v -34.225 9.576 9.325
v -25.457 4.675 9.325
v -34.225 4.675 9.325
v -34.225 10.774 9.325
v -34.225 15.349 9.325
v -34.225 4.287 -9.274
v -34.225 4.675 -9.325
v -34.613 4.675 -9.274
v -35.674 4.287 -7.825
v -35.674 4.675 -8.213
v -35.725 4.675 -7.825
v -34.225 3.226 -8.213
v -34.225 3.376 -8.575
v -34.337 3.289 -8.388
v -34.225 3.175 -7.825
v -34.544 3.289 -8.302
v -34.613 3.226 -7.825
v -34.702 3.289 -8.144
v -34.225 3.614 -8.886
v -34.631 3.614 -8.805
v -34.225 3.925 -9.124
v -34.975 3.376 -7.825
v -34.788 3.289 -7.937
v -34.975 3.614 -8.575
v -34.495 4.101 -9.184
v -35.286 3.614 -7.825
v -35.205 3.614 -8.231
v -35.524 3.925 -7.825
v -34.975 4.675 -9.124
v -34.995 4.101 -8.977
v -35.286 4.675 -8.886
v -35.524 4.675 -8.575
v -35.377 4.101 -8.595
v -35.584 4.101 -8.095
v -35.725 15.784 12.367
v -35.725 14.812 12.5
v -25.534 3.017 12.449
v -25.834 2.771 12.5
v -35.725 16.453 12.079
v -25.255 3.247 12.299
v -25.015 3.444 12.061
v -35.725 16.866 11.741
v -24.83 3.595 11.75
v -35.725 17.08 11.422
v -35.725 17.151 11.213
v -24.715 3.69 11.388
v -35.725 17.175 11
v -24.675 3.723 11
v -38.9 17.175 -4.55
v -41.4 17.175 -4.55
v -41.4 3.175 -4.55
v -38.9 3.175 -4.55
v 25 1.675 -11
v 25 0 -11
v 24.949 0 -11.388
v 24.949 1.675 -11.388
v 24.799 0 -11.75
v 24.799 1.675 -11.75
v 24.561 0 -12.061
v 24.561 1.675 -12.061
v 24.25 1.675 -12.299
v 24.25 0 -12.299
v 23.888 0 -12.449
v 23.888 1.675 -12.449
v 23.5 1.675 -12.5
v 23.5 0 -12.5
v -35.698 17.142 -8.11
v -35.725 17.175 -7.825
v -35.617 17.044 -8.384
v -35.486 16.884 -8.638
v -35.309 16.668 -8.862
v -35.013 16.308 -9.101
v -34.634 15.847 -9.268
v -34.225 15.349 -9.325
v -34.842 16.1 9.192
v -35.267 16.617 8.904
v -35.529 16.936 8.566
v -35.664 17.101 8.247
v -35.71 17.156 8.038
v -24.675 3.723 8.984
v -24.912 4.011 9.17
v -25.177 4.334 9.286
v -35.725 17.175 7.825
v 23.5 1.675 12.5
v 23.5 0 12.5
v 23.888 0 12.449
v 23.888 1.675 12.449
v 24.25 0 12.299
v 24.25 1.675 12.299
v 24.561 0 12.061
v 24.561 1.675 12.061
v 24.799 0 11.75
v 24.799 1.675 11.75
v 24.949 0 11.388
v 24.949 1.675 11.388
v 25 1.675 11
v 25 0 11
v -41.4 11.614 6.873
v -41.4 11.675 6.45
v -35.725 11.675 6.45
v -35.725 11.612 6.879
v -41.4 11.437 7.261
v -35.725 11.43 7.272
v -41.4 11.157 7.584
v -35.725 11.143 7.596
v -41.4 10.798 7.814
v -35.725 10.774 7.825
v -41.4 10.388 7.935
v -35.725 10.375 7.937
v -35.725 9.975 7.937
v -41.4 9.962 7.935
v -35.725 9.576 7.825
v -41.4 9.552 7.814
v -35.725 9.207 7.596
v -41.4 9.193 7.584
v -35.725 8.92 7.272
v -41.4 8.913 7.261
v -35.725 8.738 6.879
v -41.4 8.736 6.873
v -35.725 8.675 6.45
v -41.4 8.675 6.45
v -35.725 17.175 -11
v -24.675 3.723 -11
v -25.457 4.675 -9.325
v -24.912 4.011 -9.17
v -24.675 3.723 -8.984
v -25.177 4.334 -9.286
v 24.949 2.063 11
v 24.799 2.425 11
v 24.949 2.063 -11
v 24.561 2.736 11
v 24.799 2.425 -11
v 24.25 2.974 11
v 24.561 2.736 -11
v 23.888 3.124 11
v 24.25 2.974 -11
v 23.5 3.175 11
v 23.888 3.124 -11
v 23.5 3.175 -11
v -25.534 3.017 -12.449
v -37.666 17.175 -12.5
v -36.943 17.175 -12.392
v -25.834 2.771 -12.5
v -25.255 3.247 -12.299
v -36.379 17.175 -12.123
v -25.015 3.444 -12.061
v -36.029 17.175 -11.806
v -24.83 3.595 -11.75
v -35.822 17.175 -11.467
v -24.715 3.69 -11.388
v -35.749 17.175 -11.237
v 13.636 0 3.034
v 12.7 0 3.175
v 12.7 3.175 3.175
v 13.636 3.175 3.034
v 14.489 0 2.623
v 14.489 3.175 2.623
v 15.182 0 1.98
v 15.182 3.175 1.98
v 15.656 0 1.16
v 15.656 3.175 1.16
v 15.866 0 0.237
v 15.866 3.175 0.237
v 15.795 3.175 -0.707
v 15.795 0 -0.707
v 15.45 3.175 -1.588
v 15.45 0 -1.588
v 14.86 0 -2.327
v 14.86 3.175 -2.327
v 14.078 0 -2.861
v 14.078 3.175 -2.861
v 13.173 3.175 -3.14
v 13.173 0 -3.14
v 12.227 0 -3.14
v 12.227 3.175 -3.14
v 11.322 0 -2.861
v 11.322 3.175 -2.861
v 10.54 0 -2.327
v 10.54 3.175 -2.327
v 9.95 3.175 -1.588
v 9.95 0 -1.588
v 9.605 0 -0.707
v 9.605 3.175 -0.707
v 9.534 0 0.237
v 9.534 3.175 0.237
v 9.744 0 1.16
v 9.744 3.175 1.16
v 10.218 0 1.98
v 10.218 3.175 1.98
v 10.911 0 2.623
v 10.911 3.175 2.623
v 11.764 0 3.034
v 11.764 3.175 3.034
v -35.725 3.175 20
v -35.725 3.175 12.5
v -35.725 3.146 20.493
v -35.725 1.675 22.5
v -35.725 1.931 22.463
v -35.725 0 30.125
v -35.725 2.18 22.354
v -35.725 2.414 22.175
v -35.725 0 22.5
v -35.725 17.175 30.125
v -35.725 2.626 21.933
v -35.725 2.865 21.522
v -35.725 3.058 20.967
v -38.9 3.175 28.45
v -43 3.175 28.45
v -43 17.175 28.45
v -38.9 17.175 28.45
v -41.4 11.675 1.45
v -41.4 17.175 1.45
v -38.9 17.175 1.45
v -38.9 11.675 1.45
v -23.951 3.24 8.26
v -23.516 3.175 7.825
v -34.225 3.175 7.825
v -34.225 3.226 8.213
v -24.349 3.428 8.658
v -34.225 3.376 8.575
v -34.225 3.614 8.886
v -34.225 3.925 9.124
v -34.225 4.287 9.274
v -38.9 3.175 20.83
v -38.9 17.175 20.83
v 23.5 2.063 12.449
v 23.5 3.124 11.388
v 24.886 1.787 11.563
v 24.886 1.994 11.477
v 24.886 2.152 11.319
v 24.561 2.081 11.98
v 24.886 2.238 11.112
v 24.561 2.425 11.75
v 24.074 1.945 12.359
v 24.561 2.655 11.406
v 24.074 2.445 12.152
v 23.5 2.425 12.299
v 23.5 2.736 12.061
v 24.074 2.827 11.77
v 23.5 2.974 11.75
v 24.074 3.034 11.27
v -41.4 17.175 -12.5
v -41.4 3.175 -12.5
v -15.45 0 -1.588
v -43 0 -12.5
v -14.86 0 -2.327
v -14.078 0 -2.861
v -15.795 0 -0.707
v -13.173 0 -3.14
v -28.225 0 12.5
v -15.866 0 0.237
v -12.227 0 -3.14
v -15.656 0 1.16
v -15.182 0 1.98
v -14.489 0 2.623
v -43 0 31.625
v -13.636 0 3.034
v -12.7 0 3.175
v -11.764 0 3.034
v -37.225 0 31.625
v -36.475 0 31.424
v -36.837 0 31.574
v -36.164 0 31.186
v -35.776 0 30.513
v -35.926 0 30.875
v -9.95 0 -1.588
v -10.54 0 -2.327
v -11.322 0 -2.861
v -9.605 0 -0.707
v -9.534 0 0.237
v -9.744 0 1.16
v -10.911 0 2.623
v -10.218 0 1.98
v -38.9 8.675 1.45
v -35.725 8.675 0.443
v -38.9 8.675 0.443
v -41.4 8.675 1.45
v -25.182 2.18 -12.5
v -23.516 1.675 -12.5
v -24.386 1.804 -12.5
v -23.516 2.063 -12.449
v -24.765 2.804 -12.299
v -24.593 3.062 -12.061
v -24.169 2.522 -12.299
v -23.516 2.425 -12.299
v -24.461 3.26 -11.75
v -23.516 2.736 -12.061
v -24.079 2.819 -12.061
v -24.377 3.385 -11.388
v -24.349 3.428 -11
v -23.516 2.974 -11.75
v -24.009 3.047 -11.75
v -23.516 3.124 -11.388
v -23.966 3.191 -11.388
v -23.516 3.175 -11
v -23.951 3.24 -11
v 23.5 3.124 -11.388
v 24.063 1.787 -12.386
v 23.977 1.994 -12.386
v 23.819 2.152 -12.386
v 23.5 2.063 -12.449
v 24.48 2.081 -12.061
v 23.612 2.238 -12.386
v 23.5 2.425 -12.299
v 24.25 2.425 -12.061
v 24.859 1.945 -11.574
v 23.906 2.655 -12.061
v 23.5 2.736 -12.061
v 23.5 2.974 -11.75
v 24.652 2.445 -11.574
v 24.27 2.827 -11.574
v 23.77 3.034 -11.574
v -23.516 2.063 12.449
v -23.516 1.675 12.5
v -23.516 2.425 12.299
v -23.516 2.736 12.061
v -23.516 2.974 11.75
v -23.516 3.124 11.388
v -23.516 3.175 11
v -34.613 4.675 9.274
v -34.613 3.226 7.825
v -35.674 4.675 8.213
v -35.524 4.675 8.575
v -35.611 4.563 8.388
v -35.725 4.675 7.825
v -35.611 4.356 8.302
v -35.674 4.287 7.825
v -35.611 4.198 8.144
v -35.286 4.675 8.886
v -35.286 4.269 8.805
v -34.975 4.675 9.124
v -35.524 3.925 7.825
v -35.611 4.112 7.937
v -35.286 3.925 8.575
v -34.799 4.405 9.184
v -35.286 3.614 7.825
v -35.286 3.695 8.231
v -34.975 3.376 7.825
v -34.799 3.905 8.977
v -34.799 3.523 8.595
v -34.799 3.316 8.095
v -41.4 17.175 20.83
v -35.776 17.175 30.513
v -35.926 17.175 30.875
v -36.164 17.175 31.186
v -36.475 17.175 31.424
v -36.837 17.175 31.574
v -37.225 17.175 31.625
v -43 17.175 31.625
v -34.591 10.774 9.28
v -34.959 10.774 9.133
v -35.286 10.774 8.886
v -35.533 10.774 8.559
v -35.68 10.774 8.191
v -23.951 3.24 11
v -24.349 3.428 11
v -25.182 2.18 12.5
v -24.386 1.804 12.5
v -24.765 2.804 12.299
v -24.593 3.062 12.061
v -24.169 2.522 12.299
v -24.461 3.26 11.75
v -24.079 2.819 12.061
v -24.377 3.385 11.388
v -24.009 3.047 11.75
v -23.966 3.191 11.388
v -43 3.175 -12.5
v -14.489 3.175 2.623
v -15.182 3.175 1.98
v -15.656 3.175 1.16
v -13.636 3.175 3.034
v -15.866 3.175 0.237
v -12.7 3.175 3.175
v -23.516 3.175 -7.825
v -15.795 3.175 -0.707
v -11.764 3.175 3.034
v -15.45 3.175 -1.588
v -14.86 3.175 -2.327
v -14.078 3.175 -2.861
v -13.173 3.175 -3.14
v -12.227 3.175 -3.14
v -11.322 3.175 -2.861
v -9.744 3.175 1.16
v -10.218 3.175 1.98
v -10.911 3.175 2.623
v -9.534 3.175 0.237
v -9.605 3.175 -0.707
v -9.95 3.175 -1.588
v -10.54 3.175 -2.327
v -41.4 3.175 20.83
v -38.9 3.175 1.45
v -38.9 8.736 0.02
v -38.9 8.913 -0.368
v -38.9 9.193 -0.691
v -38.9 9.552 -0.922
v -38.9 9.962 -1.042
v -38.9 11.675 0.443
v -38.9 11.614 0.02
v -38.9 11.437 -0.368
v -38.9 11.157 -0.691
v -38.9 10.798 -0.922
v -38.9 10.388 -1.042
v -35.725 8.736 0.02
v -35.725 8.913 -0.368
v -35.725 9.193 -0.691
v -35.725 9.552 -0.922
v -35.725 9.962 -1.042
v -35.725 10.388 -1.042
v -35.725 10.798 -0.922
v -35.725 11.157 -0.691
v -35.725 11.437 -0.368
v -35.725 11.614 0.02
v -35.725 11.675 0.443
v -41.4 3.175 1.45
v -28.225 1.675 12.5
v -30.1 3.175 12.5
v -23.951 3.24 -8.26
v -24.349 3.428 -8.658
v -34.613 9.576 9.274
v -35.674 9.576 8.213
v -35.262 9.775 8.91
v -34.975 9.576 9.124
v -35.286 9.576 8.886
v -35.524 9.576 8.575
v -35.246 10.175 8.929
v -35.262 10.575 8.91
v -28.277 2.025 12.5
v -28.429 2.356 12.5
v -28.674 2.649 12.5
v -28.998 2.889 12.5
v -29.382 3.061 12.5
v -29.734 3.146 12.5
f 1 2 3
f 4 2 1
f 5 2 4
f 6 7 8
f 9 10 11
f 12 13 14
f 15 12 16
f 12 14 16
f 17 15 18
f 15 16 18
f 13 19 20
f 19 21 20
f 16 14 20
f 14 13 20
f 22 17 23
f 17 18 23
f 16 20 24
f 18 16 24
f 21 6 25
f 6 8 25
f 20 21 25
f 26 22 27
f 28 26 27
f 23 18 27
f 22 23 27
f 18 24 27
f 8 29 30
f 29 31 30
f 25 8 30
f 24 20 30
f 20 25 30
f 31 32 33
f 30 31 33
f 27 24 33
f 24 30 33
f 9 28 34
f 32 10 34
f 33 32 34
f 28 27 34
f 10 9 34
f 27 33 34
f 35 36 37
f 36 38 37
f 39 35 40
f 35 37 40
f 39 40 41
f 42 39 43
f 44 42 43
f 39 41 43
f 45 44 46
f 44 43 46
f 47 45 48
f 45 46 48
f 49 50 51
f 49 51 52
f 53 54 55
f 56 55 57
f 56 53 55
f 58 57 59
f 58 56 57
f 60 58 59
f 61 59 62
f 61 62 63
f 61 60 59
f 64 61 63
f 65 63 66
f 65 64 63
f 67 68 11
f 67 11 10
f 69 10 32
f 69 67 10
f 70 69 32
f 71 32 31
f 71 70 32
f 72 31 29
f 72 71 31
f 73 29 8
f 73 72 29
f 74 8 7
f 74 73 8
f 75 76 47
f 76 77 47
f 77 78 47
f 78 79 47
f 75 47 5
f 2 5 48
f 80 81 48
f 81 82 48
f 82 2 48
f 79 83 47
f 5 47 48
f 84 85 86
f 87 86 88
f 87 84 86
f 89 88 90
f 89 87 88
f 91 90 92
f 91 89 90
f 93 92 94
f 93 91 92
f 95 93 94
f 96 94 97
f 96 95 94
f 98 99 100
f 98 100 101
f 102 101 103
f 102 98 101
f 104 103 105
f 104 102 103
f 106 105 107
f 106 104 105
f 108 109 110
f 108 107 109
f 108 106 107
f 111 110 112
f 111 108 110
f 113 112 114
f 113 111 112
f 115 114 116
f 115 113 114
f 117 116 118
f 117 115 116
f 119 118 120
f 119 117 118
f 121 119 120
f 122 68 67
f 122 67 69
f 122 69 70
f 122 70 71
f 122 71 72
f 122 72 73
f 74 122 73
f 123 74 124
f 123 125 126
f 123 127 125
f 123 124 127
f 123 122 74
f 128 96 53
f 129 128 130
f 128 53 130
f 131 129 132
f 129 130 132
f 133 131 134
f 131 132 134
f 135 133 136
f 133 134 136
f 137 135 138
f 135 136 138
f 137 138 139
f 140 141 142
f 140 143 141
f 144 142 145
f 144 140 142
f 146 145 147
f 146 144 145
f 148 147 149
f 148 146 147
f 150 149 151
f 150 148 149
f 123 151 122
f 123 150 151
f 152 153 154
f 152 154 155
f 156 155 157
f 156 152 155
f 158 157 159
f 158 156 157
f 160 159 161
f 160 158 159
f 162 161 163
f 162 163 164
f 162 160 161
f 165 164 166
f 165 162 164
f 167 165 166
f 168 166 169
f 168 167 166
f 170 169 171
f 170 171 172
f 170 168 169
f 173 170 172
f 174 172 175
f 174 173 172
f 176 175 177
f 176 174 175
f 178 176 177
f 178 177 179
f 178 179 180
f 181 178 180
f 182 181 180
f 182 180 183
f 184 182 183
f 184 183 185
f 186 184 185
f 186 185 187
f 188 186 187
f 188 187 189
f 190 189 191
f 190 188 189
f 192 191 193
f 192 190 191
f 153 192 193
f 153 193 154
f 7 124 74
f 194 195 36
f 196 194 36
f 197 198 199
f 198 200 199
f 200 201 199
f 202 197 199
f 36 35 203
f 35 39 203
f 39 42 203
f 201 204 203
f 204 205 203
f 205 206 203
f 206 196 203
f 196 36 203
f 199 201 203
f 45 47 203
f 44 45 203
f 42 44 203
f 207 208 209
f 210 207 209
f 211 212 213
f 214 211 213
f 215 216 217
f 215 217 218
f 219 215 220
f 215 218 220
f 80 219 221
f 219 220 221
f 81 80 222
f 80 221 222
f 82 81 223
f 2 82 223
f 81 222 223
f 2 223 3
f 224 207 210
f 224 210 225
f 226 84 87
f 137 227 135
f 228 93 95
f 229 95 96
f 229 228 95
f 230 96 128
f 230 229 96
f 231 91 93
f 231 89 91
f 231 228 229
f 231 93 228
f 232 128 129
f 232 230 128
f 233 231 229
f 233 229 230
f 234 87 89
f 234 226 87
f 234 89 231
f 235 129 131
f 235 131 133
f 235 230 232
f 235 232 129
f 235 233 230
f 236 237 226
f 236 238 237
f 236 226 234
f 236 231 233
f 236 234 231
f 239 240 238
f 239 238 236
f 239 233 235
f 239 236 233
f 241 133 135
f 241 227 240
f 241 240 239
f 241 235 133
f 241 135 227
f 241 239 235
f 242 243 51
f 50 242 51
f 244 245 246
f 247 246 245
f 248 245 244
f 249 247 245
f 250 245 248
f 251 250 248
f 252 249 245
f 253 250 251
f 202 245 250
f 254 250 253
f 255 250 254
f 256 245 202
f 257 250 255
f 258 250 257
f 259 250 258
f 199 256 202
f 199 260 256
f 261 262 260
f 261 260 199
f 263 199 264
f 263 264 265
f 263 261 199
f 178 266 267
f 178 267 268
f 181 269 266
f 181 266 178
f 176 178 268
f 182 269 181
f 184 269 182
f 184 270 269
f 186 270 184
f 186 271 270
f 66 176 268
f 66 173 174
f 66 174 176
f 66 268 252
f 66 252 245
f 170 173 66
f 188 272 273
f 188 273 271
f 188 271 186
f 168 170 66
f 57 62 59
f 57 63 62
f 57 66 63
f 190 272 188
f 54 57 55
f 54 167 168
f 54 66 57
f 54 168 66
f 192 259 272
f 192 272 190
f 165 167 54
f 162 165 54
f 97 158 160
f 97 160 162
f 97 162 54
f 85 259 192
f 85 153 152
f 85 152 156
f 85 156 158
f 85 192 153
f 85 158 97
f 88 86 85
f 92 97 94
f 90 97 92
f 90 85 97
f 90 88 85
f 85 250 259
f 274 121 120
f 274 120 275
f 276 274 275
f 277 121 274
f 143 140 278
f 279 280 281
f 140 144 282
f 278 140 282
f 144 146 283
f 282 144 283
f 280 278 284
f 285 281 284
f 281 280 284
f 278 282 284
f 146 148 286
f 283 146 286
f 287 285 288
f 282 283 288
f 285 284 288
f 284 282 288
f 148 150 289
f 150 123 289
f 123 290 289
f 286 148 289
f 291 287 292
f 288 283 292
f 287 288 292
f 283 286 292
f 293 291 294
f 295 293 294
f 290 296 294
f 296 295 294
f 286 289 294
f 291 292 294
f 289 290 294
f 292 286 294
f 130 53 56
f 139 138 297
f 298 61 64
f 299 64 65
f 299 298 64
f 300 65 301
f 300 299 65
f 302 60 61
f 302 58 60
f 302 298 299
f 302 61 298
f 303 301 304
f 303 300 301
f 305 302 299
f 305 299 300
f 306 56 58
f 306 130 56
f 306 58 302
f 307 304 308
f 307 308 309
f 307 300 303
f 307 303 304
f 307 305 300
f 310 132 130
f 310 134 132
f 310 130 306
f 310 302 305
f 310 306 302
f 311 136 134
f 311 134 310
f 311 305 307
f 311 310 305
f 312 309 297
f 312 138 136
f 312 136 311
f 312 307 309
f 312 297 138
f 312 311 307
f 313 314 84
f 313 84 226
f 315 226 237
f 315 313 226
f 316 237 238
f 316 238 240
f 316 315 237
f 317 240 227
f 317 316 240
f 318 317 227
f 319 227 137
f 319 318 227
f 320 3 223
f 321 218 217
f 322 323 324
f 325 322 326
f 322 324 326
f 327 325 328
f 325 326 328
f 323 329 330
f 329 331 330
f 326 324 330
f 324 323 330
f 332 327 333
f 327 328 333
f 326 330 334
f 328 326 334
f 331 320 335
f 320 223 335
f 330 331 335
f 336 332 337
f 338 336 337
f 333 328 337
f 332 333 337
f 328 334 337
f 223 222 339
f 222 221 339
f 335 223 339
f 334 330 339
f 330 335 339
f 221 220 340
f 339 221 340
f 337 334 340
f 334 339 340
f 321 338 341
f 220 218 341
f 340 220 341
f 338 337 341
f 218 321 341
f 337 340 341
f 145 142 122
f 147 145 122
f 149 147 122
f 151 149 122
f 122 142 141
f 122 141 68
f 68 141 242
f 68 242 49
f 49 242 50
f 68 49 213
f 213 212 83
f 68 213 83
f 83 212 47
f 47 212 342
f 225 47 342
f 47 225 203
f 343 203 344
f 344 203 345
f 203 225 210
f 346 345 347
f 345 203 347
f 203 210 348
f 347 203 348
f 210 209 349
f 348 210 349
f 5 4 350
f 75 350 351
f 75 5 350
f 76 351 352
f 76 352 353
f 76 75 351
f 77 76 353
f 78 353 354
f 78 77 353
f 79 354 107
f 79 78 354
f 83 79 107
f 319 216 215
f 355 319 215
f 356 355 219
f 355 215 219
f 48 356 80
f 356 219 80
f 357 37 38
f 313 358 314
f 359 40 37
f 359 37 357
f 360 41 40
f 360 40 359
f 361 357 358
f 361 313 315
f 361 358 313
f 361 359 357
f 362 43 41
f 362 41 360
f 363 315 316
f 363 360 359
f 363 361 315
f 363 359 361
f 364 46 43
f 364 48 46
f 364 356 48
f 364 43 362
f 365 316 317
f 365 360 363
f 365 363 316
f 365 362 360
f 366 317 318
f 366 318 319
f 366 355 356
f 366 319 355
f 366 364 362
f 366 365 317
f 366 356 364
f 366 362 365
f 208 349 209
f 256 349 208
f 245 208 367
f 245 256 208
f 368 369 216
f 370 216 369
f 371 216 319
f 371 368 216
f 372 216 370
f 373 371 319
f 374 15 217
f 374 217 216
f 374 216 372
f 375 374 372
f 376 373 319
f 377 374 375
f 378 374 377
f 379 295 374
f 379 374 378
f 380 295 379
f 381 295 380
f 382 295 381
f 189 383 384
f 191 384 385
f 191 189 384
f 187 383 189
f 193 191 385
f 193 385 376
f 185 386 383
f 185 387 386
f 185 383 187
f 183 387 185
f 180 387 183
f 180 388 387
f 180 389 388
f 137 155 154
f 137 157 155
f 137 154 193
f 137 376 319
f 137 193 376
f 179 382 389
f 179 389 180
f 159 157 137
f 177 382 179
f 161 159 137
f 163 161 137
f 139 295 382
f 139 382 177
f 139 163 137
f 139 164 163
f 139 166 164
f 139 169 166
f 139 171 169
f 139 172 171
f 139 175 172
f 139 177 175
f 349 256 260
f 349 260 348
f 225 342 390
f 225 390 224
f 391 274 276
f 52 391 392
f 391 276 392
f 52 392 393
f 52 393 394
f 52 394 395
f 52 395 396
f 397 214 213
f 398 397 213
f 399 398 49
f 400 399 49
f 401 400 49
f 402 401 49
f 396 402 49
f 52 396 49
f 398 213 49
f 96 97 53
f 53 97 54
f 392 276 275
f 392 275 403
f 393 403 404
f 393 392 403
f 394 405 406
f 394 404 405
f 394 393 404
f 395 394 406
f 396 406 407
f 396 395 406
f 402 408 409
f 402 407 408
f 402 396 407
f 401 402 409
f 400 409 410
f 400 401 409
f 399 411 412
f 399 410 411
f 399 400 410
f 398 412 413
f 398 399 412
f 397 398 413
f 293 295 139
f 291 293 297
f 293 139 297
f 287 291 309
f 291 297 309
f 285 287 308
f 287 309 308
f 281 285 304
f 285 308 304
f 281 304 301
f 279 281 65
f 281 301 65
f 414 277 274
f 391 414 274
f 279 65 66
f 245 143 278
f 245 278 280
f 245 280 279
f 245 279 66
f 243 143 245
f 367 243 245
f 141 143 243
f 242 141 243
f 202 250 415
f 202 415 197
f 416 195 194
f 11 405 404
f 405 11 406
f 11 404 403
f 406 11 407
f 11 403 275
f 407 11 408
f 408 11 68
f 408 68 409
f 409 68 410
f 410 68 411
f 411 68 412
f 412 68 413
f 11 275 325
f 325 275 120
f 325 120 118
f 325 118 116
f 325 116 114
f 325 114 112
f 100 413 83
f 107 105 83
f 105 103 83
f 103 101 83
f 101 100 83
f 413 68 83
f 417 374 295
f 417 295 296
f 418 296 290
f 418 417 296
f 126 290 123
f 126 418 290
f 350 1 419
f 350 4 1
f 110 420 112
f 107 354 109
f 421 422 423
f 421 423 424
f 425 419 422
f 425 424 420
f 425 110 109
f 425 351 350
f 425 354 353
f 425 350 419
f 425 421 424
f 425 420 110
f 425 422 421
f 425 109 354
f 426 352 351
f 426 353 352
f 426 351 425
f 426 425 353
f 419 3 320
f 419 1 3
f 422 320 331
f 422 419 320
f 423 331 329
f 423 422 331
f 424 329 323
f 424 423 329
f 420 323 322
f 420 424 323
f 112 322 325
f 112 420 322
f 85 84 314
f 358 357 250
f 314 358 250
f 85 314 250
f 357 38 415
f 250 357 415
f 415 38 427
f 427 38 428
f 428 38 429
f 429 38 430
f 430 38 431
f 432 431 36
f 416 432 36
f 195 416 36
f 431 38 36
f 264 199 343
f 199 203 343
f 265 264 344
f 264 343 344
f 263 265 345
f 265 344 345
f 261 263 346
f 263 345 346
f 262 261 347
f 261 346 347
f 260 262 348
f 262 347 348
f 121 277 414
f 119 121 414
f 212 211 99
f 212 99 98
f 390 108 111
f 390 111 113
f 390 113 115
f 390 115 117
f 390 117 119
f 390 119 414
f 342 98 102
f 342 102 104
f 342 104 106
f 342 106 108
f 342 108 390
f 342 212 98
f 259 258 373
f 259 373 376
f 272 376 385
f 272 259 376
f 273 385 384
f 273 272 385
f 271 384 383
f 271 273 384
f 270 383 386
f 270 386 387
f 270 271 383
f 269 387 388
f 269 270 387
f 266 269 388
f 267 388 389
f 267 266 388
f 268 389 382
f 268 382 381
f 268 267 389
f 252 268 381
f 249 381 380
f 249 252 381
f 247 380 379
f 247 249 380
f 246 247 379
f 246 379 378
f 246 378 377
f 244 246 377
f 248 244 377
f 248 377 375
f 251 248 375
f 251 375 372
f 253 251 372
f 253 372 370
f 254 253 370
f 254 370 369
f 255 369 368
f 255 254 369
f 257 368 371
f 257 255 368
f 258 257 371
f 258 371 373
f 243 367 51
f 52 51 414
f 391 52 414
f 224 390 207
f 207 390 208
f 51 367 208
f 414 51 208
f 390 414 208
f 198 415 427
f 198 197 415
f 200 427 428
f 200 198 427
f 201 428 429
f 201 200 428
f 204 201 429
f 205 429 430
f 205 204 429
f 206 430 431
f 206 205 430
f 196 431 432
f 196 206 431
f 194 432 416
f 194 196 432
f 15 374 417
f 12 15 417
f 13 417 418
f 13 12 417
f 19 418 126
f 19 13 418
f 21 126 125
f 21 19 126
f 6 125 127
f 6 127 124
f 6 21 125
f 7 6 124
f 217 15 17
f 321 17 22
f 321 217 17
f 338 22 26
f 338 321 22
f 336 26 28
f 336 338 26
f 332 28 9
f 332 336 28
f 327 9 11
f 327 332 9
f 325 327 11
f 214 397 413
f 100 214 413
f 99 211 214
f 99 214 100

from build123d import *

# Parameters (mm, degrees)
SKETCH2_W           = 50
SKETCH2_H           = 25
SKETCH2_R           = 3.175
BOSS_EXTRUDE1_DEPTH = 3.175
SKETCH11_W          = 18
SKETCH11_H          = 25
BOSS_EXTRUDE4_DEPTH = 3.175
SKETCH12_W          = 44.125
SKETCH12_H          = 17.175
BOSS_EXTRUDE5_DEPTH = 7.275
SKETCH13_W          = 45.360945172
SKETCH13_H          = 22.695099396
CUT_EXTRUDE1_DEPTH  = 1.6
CUT_EXTRUDE2_DEPTH  = 76.525368255
BOSS_EXTRUDE6_DEPTH = 3.175
BOSS_EXTRUDE7_DEPTH = 3.175
FILLET7_R           = 1.5
SKETCH17_W          = 2.5
SKETCH17_H          = 7.62
SKETCH17_H_2        = 6
CUT_EXTRUDE3_DEPTH  = 14


with BuildPart() as part:
    # Sketch2 → Boss-Extrude1 (new body)
    with BuildSketch(Plane(origin=(0, 0, 0), x_dir=(1, 0, 0), z_dir=(0, 1, 0))):
        Rectangle(SKETCH2_W, SKETCH2_H)
        with Locations(Location((-12.7, 0, 0), (0, 0, 270))):
            Circle(SKETCH2_R, mode=Mode.SUBTRACT)
        with Locations(Location((12.7, 0, 0), (0, 0, 270))):
            Circle(SKETCH2_R, mode=Mode.SUBTRACT)
    extrude(amount=BOSS_EXTRUDE1_DEPTH)

    # Sketch11 → Boss-Extrude4 (add)
    with BuildSketch(Plane(origin=(0, 0, 0), x_dir=(1, 0, 0), z_dir=(0, 1, 0))):
        with Locations((-34, 0)):
            Rectangle(SKETCH11_W, SKETCH11_H)
    extrude(amount=BOSS_EXTRUDE4_DEPTH)

    # Sketch12 → Boss-Extrude5 (add)
    with BuildSketch(Plane.ZY.offset(43)):
        with Locations((9.5625, 8.5875)):
            Rectangle(SKETCH12_W, SKETCH12_H)
    extrude(amount=-BOSS_EXTRUDE5_DEPTH)

    # Sketch13 → Cut-Extrude1 (cut)
    with BuildSketch(Plane.ZY.offset(43)):
        with Locations((5.769527414, 14.522549698)):
            Rectangle(SKETCH13_W, SKETCH13_H)
    extrude(amount=-CUT_EXTRUDE1_DEPTH, mode=Mode.SUBTRACT)

    # Sketch14 → Cut-Extrude2 (cut, through all)
    with BuildSketch(Plane.ZY.offset(41.4)):
        with BuildLine():
            Line((6.45, 8.675), (0.442633339, 8.675))
            ThreePointArc((0.442633339, 8.675), (-1.057366661, 10.175), (0.442633339, 11.675))
            Line((0.442633339, 11.675), (6.45, 11.675))
            ThreePointArc((6.45, 11.675), (7.95, 10.175), (6.45, 8.675))
        make_face()
    extrude(amount=-CUT_EXTRUDE2_DEPTH, mode=Mode.SUBTRACT)

    # Sketch15 → Boss-Extrude6 (add)
    with BuildSketch(Plane(origin=(0, 0, -12.5), x_dir=(-1, 0, 0), z_dir=(0, 0, -1))):
        Polygon((35.725, 17.175), (24.225, 3.175), (35.725, 3.175), align=None)
    boss_extrude6 = extrude(amount=-BOSS_EXTRUDE6_DEPTH)

    # Mirror1: Boss-Extrude6 across plane
    add(boss_extrude6.mirror(Plane.XY))

    # Sketch16 → Boss-Extrude7 (add)
    with BuildSketch(Plane.XZ):
        Polygon((-35.725, 12.5), (-28.225, 12.5), (-35.725, 22.5), align=None)
    extrude(amount=-BOSS_EXTRUDE7_DEPTH)

    # Fillet7
    fillet7_edges = [part.edges().sort_by_distance(p)[0] for p in [
        (-29.975, 10.175, 12.5),
        (-29.975, 10.175, -12.5),
        (0.3875, 3.175, 12.5),
        (25, 1.5875, 12.5),
        (25, 3.175, 0),
        (25, 1.5875, -12.5),
        (0.3875, 3.175, -12.5),
        (-35.725, 10.175, -9.325),
        (-29.975, 3.175, -9.325),
        (-29.975, 3.175, 9.325),
        (-35.725, 10.175, 9.325),
        (-35.725, 3.175, 0),
        (-31.975, 3.175, 17.5),
        (-24.225, 3.175, -10.9125),
        (-24.225, 3.175, 10.9125),
        (-35.725, 8.5875, 31.625),
    ]]
    fillet(fillet7_edges, radius=FILLET7_R)

    # Sketch17 → Cut-Extrude3 (cut)
    with BuildSketch(Plane(origin=(0, 17.175, 0), x_dir=(1, 0, 0), z_dir=(0, 1, 0))):
        with Locations((-40.15, -24.64)):
            Rectangle(SKETCH17_W, SKETCH17_H)
        with Locations((-40.15, 1.55)):
            Rectangle(SKETCH17_W, SKETCH17_H_2)
    extrude(amount=-CUT_EXTRUDE3_DEPTH, mode=Mode.SUBTRACT)


solid = part.part
